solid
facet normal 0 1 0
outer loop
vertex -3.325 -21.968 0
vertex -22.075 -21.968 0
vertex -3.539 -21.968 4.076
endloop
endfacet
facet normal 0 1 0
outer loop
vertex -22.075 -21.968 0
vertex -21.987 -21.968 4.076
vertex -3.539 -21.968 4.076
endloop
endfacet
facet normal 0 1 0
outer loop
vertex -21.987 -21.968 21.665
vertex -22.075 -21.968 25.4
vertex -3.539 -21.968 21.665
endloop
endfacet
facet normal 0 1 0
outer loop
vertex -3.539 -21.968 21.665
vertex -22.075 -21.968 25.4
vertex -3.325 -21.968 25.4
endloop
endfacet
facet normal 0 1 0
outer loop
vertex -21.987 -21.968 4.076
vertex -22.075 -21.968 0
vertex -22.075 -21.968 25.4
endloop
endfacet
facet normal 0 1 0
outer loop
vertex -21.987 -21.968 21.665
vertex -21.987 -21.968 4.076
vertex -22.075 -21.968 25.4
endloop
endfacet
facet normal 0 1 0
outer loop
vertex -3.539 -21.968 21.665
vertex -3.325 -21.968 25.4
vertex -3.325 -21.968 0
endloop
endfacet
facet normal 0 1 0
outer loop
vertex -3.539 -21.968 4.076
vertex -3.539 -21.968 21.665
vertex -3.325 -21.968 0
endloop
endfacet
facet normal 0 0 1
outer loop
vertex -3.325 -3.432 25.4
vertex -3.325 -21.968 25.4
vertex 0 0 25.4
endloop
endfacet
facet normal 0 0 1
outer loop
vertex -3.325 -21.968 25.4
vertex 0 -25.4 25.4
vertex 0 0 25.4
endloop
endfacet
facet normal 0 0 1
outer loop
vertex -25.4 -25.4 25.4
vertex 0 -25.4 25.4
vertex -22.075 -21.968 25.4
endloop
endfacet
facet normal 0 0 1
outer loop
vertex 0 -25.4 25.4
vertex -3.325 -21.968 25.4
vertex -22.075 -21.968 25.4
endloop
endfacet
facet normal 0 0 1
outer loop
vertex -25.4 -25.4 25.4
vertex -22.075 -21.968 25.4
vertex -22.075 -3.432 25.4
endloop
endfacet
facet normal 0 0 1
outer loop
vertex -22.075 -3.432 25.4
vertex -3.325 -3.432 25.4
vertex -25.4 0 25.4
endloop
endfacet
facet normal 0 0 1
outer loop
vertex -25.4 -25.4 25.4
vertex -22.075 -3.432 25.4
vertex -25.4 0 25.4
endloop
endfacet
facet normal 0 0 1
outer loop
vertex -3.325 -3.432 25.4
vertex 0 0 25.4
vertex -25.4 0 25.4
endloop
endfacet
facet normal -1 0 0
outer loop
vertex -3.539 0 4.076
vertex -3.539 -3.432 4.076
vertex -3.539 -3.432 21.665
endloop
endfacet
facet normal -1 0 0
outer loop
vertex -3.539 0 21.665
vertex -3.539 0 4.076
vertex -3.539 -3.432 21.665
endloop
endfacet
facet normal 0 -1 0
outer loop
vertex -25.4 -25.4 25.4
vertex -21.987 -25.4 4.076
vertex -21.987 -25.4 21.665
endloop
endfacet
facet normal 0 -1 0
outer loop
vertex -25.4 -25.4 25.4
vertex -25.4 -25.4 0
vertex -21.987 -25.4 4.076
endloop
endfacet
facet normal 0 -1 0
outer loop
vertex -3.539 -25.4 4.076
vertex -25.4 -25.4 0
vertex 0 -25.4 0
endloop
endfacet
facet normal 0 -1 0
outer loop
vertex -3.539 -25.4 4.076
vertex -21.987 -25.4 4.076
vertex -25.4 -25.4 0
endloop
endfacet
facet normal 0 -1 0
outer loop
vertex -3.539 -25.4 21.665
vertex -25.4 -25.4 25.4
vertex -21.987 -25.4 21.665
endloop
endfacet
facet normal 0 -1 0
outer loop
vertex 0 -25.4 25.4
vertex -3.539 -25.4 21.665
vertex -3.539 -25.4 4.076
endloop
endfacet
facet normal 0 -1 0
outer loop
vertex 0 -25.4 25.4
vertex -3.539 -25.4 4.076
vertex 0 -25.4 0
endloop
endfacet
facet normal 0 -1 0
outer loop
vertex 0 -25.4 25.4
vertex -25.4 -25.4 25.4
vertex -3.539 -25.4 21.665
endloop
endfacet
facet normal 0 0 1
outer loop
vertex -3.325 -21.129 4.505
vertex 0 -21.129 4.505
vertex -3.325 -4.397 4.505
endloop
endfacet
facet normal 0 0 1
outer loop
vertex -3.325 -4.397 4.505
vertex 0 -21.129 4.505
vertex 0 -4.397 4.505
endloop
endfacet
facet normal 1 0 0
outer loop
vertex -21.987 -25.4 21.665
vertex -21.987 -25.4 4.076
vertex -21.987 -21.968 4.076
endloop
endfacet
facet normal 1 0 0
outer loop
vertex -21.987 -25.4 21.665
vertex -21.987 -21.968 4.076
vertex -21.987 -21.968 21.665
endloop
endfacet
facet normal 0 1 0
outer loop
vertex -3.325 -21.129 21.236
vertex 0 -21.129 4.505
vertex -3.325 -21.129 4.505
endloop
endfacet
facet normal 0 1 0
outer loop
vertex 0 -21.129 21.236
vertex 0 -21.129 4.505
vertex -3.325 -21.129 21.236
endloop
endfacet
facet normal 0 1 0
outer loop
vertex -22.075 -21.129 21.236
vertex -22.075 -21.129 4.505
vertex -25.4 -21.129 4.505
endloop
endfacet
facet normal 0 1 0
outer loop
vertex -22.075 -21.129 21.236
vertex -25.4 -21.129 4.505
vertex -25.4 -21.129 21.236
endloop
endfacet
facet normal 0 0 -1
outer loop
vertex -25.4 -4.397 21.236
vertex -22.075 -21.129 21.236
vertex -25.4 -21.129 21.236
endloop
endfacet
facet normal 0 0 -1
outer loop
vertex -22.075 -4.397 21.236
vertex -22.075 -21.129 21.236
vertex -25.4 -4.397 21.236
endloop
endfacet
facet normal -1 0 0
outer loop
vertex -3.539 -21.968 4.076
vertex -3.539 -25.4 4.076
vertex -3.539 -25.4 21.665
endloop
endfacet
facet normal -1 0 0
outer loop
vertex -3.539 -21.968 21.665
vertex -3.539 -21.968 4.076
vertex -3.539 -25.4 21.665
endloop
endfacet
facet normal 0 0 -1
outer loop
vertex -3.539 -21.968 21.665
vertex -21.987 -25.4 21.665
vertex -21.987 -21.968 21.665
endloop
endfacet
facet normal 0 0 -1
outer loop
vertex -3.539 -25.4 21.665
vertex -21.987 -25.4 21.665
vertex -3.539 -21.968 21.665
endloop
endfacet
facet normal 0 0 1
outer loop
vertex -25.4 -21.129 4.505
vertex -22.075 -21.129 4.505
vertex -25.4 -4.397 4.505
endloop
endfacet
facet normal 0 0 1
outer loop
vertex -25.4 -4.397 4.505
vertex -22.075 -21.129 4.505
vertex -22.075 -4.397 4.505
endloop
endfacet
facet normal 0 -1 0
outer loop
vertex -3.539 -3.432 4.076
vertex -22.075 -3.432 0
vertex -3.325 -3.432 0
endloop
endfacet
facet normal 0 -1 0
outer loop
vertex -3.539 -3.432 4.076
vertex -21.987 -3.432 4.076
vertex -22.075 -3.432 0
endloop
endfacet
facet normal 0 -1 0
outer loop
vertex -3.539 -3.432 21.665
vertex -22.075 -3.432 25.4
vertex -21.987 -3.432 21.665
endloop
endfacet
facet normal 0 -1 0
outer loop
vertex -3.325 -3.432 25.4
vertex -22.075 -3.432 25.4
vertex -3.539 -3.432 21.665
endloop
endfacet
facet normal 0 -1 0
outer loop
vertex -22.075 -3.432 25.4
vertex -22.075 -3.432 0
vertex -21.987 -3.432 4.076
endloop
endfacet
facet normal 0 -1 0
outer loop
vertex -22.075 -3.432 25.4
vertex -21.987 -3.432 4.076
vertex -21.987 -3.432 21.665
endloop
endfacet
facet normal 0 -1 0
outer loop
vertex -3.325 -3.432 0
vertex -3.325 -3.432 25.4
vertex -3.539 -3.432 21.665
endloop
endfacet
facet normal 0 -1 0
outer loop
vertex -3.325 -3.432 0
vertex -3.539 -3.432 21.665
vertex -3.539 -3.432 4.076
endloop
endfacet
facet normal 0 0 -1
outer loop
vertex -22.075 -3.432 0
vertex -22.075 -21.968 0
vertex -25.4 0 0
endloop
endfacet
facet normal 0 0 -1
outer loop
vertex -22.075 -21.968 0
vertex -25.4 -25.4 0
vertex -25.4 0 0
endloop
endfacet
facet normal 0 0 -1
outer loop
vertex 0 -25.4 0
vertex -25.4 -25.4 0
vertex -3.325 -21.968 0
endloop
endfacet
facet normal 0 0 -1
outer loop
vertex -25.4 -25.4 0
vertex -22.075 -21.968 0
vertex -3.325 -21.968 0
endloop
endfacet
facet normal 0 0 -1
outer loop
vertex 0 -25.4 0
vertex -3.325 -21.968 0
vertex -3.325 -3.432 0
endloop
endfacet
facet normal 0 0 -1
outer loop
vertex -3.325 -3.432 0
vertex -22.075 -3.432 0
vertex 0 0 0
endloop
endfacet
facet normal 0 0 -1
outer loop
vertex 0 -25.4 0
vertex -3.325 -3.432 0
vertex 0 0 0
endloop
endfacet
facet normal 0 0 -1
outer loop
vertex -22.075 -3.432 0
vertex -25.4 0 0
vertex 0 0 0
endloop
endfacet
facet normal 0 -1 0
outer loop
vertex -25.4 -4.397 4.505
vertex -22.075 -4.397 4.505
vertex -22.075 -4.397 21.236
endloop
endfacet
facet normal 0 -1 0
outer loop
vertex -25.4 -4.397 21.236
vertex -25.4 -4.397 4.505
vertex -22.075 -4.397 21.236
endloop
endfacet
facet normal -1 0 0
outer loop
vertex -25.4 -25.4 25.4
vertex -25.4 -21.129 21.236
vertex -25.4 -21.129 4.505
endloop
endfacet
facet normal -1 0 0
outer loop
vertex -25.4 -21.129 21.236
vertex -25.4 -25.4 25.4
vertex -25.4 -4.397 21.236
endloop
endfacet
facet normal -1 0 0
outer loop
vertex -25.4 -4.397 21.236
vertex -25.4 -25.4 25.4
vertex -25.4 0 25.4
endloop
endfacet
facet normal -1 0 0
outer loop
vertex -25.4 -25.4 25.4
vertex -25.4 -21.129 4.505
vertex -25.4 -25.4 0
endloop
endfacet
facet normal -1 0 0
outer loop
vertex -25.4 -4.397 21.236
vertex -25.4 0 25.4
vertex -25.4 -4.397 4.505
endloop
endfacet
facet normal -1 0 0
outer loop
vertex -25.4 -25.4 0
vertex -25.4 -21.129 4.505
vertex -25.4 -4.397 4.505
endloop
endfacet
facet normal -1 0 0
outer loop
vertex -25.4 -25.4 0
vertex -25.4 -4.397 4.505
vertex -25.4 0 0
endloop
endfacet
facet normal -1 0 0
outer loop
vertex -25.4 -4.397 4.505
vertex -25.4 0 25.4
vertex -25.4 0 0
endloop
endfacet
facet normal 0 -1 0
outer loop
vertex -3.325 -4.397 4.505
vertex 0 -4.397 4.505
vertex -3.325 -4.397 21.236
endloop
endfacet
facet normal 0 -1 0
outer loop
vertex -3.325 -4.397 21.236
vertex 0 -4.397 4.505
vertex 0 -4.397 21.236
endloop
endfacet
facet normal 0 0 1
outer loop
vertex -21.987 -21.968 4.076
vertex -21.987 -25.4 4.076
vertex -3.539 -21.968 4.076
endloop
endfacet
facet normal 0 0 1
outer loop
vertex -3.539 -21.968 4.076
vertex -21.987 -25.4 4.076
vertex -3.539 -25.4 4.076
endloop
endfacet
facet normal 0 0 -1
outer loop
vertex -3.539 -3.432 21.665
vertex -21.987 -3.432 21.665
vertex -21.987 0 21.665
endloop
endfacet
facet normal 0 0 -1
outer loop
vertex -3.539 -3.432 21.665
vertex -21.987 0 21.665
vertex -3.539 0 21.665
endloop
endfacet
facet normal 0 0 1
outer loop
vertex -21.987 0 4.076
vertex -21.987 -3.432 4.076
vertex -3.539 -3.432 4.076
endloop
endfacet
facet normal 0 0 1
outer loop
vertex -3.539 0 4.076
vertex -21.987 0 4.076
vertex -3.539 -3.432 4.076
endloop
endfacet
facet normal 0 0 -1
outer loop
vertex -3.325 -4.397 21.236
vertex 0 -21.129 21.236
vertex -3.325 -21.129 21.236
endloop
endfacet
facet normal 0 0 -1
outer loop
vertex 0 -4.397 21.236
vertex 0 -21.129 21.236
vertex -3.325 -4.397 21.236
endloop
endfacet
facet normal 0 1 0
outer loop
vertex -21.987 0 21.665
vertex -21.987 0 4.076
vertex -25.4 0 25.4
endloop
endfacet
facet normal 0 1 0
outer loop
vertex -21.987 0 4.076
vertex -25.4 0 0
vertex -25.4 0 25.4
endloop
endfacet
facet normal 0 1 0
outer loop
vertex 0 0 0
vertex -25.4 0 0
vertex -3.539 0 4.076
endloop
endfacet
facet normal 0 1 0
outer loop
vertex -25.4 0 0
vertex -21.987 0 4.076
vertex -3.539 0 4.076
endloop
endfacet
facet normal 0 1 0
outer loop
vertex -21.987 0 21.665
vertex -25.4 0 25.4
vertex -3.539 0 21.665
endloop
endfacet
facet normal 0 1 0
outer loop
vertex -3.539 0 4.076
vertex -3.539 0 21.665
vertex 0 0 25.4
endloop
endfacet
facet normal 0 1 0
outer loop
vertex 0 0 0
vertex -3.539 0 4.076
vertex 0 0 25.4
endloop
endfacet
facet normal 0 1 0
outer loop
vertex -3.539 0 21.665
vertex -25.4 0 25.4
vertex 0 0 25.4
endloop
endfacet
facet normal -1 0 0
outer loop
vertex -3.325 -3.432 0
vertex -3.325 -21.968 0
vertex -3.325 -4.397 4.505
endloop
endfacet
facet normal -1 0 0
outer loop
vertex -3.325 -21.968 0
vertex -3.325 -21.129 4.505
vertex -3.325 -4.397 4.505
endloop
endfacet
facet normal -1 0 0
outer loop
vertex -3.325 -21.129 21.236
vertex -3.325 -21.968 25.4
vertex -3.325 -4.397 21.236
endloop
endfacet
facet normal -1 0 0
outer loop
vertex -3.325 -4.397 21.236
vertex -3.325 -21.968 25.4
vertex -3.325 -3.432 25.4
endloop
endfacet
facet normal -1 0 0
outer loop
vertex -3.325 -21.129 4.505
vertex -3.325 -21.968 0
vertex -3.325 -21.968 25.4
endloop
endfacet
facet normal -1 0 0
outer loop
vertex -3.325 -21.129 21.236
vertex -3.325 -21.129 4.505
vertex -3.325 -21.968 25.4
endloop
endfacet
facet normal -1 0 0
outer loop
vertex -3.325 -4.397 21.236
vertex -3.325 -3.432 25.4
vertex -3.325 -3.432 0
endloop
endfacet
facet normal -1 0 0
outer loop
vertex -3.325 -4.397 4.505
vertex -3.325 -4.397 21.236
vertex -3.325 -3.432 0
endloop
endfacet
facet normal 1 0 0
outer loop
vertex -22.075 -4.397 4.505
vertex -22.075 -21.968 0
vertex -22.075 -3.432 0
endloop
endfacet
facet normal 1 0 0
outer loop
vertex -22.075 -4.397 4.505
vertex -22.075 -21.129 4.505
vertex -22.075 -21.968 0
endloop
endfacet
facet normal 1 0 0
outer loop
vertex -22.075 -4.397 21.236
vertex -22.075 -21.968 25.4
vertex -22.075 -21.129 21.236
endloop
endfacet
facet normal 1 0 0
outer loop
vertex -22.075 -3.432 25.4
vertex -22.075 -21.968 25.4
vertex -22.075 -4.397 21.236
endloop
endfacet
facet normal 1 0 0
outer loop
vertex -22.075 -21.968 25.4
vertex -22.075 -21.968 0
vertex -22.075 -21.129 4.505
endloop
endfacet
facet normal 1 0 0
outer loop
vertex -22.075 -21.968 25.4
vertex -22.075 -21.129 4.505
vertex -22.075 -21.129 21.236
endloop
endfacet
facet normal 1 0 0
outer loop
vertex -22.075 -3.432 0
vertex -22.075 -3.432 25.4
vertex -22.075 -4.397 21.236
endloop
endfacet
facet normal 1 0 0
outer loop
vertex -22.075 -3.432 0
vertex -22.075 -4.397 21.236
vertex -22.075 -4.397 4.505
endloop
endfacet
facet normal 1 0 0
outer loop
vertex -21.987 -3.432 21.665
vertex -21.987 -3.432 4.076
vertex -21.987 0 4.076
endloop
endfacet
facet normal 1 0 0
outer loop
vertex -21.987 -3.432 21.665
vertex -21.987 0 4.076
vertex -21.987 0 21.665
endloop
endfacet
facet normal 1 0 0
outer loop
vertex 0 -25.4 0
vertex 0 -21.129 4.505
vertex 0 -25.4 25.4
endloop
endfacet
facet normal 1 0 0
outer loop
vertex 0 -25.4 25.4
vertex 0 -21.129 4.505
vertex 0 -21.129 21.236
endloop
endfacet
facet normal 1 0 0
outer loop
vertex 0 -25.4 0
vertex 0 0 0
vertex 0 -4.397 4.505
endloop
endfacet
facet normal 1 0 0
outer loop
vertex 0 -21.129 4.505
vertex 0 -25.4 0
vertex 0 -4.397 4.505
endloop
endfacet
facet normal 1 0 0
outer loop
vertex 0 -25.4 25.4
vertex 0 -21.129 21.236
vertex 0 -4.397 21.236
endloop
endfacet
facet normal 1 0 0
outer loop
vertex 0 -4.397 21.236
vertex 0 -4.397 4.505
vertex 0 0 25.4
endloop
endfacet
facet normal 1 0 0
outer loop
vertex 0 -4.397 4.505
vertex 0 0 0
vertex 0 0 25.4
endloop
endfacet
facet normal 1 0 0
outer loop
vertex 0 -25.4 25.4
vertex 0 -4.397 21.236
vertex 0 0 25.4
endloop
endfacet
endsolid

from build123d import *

# Parameters (mm, degrees)
F1_DEPTH = 25.4
F2_W     = 18.447345
F2_H     = 17.589332
F3_DEPTH = 25.4
F4_W     = 16.731317
F4_H     = 16.731312
F5_DEPTH = 25.4
F6_W     = 18.750374
F6_H     = 18.53587
F7_DEPTH = 25.4


with BuildPart() as f1:
    # F0 (on Front) → F1 (new body)
    with BuildSketch(Plane.XZ):
        Polygon((-25.4, 0), (0, 0), (0, 25.4), (-1.806476, 25.4), (-25.4, 25.4), align=None)
    extrude(amount=F1_DEPTH)

    # F2 (on face) → F3 (cut)
    with BuildSketch(Plane.XZ.offset(25.4)):
        with Locations((-12.762988, 12.870242)):
            Rectangle(F2_W, F2_H)
    extrude(amount=-F3_DEPTH, mode=Mode.SUBTRACT)

    # F4 (on face) → F5 (cut)
    with BuildSketch(Plane.YZ):
        with Locations((-12.762989, 12.870242)):
            Rectangle(F4_W, F4_H)
    extrude(amount=-F5_DEPTH, mode=Mode.SUBTRACT)

    # F6 (on face) → F7 (cut)
    with BuildSketch(Plane.XY.offset(25.4)):
        with Locations((-12.7, -12.7)):
            Rectangle(F6_W, F6_H)
    extrude(amount=-F7_DEPTH, mode=Mode.SUBTRACT)


solid = f1.part
